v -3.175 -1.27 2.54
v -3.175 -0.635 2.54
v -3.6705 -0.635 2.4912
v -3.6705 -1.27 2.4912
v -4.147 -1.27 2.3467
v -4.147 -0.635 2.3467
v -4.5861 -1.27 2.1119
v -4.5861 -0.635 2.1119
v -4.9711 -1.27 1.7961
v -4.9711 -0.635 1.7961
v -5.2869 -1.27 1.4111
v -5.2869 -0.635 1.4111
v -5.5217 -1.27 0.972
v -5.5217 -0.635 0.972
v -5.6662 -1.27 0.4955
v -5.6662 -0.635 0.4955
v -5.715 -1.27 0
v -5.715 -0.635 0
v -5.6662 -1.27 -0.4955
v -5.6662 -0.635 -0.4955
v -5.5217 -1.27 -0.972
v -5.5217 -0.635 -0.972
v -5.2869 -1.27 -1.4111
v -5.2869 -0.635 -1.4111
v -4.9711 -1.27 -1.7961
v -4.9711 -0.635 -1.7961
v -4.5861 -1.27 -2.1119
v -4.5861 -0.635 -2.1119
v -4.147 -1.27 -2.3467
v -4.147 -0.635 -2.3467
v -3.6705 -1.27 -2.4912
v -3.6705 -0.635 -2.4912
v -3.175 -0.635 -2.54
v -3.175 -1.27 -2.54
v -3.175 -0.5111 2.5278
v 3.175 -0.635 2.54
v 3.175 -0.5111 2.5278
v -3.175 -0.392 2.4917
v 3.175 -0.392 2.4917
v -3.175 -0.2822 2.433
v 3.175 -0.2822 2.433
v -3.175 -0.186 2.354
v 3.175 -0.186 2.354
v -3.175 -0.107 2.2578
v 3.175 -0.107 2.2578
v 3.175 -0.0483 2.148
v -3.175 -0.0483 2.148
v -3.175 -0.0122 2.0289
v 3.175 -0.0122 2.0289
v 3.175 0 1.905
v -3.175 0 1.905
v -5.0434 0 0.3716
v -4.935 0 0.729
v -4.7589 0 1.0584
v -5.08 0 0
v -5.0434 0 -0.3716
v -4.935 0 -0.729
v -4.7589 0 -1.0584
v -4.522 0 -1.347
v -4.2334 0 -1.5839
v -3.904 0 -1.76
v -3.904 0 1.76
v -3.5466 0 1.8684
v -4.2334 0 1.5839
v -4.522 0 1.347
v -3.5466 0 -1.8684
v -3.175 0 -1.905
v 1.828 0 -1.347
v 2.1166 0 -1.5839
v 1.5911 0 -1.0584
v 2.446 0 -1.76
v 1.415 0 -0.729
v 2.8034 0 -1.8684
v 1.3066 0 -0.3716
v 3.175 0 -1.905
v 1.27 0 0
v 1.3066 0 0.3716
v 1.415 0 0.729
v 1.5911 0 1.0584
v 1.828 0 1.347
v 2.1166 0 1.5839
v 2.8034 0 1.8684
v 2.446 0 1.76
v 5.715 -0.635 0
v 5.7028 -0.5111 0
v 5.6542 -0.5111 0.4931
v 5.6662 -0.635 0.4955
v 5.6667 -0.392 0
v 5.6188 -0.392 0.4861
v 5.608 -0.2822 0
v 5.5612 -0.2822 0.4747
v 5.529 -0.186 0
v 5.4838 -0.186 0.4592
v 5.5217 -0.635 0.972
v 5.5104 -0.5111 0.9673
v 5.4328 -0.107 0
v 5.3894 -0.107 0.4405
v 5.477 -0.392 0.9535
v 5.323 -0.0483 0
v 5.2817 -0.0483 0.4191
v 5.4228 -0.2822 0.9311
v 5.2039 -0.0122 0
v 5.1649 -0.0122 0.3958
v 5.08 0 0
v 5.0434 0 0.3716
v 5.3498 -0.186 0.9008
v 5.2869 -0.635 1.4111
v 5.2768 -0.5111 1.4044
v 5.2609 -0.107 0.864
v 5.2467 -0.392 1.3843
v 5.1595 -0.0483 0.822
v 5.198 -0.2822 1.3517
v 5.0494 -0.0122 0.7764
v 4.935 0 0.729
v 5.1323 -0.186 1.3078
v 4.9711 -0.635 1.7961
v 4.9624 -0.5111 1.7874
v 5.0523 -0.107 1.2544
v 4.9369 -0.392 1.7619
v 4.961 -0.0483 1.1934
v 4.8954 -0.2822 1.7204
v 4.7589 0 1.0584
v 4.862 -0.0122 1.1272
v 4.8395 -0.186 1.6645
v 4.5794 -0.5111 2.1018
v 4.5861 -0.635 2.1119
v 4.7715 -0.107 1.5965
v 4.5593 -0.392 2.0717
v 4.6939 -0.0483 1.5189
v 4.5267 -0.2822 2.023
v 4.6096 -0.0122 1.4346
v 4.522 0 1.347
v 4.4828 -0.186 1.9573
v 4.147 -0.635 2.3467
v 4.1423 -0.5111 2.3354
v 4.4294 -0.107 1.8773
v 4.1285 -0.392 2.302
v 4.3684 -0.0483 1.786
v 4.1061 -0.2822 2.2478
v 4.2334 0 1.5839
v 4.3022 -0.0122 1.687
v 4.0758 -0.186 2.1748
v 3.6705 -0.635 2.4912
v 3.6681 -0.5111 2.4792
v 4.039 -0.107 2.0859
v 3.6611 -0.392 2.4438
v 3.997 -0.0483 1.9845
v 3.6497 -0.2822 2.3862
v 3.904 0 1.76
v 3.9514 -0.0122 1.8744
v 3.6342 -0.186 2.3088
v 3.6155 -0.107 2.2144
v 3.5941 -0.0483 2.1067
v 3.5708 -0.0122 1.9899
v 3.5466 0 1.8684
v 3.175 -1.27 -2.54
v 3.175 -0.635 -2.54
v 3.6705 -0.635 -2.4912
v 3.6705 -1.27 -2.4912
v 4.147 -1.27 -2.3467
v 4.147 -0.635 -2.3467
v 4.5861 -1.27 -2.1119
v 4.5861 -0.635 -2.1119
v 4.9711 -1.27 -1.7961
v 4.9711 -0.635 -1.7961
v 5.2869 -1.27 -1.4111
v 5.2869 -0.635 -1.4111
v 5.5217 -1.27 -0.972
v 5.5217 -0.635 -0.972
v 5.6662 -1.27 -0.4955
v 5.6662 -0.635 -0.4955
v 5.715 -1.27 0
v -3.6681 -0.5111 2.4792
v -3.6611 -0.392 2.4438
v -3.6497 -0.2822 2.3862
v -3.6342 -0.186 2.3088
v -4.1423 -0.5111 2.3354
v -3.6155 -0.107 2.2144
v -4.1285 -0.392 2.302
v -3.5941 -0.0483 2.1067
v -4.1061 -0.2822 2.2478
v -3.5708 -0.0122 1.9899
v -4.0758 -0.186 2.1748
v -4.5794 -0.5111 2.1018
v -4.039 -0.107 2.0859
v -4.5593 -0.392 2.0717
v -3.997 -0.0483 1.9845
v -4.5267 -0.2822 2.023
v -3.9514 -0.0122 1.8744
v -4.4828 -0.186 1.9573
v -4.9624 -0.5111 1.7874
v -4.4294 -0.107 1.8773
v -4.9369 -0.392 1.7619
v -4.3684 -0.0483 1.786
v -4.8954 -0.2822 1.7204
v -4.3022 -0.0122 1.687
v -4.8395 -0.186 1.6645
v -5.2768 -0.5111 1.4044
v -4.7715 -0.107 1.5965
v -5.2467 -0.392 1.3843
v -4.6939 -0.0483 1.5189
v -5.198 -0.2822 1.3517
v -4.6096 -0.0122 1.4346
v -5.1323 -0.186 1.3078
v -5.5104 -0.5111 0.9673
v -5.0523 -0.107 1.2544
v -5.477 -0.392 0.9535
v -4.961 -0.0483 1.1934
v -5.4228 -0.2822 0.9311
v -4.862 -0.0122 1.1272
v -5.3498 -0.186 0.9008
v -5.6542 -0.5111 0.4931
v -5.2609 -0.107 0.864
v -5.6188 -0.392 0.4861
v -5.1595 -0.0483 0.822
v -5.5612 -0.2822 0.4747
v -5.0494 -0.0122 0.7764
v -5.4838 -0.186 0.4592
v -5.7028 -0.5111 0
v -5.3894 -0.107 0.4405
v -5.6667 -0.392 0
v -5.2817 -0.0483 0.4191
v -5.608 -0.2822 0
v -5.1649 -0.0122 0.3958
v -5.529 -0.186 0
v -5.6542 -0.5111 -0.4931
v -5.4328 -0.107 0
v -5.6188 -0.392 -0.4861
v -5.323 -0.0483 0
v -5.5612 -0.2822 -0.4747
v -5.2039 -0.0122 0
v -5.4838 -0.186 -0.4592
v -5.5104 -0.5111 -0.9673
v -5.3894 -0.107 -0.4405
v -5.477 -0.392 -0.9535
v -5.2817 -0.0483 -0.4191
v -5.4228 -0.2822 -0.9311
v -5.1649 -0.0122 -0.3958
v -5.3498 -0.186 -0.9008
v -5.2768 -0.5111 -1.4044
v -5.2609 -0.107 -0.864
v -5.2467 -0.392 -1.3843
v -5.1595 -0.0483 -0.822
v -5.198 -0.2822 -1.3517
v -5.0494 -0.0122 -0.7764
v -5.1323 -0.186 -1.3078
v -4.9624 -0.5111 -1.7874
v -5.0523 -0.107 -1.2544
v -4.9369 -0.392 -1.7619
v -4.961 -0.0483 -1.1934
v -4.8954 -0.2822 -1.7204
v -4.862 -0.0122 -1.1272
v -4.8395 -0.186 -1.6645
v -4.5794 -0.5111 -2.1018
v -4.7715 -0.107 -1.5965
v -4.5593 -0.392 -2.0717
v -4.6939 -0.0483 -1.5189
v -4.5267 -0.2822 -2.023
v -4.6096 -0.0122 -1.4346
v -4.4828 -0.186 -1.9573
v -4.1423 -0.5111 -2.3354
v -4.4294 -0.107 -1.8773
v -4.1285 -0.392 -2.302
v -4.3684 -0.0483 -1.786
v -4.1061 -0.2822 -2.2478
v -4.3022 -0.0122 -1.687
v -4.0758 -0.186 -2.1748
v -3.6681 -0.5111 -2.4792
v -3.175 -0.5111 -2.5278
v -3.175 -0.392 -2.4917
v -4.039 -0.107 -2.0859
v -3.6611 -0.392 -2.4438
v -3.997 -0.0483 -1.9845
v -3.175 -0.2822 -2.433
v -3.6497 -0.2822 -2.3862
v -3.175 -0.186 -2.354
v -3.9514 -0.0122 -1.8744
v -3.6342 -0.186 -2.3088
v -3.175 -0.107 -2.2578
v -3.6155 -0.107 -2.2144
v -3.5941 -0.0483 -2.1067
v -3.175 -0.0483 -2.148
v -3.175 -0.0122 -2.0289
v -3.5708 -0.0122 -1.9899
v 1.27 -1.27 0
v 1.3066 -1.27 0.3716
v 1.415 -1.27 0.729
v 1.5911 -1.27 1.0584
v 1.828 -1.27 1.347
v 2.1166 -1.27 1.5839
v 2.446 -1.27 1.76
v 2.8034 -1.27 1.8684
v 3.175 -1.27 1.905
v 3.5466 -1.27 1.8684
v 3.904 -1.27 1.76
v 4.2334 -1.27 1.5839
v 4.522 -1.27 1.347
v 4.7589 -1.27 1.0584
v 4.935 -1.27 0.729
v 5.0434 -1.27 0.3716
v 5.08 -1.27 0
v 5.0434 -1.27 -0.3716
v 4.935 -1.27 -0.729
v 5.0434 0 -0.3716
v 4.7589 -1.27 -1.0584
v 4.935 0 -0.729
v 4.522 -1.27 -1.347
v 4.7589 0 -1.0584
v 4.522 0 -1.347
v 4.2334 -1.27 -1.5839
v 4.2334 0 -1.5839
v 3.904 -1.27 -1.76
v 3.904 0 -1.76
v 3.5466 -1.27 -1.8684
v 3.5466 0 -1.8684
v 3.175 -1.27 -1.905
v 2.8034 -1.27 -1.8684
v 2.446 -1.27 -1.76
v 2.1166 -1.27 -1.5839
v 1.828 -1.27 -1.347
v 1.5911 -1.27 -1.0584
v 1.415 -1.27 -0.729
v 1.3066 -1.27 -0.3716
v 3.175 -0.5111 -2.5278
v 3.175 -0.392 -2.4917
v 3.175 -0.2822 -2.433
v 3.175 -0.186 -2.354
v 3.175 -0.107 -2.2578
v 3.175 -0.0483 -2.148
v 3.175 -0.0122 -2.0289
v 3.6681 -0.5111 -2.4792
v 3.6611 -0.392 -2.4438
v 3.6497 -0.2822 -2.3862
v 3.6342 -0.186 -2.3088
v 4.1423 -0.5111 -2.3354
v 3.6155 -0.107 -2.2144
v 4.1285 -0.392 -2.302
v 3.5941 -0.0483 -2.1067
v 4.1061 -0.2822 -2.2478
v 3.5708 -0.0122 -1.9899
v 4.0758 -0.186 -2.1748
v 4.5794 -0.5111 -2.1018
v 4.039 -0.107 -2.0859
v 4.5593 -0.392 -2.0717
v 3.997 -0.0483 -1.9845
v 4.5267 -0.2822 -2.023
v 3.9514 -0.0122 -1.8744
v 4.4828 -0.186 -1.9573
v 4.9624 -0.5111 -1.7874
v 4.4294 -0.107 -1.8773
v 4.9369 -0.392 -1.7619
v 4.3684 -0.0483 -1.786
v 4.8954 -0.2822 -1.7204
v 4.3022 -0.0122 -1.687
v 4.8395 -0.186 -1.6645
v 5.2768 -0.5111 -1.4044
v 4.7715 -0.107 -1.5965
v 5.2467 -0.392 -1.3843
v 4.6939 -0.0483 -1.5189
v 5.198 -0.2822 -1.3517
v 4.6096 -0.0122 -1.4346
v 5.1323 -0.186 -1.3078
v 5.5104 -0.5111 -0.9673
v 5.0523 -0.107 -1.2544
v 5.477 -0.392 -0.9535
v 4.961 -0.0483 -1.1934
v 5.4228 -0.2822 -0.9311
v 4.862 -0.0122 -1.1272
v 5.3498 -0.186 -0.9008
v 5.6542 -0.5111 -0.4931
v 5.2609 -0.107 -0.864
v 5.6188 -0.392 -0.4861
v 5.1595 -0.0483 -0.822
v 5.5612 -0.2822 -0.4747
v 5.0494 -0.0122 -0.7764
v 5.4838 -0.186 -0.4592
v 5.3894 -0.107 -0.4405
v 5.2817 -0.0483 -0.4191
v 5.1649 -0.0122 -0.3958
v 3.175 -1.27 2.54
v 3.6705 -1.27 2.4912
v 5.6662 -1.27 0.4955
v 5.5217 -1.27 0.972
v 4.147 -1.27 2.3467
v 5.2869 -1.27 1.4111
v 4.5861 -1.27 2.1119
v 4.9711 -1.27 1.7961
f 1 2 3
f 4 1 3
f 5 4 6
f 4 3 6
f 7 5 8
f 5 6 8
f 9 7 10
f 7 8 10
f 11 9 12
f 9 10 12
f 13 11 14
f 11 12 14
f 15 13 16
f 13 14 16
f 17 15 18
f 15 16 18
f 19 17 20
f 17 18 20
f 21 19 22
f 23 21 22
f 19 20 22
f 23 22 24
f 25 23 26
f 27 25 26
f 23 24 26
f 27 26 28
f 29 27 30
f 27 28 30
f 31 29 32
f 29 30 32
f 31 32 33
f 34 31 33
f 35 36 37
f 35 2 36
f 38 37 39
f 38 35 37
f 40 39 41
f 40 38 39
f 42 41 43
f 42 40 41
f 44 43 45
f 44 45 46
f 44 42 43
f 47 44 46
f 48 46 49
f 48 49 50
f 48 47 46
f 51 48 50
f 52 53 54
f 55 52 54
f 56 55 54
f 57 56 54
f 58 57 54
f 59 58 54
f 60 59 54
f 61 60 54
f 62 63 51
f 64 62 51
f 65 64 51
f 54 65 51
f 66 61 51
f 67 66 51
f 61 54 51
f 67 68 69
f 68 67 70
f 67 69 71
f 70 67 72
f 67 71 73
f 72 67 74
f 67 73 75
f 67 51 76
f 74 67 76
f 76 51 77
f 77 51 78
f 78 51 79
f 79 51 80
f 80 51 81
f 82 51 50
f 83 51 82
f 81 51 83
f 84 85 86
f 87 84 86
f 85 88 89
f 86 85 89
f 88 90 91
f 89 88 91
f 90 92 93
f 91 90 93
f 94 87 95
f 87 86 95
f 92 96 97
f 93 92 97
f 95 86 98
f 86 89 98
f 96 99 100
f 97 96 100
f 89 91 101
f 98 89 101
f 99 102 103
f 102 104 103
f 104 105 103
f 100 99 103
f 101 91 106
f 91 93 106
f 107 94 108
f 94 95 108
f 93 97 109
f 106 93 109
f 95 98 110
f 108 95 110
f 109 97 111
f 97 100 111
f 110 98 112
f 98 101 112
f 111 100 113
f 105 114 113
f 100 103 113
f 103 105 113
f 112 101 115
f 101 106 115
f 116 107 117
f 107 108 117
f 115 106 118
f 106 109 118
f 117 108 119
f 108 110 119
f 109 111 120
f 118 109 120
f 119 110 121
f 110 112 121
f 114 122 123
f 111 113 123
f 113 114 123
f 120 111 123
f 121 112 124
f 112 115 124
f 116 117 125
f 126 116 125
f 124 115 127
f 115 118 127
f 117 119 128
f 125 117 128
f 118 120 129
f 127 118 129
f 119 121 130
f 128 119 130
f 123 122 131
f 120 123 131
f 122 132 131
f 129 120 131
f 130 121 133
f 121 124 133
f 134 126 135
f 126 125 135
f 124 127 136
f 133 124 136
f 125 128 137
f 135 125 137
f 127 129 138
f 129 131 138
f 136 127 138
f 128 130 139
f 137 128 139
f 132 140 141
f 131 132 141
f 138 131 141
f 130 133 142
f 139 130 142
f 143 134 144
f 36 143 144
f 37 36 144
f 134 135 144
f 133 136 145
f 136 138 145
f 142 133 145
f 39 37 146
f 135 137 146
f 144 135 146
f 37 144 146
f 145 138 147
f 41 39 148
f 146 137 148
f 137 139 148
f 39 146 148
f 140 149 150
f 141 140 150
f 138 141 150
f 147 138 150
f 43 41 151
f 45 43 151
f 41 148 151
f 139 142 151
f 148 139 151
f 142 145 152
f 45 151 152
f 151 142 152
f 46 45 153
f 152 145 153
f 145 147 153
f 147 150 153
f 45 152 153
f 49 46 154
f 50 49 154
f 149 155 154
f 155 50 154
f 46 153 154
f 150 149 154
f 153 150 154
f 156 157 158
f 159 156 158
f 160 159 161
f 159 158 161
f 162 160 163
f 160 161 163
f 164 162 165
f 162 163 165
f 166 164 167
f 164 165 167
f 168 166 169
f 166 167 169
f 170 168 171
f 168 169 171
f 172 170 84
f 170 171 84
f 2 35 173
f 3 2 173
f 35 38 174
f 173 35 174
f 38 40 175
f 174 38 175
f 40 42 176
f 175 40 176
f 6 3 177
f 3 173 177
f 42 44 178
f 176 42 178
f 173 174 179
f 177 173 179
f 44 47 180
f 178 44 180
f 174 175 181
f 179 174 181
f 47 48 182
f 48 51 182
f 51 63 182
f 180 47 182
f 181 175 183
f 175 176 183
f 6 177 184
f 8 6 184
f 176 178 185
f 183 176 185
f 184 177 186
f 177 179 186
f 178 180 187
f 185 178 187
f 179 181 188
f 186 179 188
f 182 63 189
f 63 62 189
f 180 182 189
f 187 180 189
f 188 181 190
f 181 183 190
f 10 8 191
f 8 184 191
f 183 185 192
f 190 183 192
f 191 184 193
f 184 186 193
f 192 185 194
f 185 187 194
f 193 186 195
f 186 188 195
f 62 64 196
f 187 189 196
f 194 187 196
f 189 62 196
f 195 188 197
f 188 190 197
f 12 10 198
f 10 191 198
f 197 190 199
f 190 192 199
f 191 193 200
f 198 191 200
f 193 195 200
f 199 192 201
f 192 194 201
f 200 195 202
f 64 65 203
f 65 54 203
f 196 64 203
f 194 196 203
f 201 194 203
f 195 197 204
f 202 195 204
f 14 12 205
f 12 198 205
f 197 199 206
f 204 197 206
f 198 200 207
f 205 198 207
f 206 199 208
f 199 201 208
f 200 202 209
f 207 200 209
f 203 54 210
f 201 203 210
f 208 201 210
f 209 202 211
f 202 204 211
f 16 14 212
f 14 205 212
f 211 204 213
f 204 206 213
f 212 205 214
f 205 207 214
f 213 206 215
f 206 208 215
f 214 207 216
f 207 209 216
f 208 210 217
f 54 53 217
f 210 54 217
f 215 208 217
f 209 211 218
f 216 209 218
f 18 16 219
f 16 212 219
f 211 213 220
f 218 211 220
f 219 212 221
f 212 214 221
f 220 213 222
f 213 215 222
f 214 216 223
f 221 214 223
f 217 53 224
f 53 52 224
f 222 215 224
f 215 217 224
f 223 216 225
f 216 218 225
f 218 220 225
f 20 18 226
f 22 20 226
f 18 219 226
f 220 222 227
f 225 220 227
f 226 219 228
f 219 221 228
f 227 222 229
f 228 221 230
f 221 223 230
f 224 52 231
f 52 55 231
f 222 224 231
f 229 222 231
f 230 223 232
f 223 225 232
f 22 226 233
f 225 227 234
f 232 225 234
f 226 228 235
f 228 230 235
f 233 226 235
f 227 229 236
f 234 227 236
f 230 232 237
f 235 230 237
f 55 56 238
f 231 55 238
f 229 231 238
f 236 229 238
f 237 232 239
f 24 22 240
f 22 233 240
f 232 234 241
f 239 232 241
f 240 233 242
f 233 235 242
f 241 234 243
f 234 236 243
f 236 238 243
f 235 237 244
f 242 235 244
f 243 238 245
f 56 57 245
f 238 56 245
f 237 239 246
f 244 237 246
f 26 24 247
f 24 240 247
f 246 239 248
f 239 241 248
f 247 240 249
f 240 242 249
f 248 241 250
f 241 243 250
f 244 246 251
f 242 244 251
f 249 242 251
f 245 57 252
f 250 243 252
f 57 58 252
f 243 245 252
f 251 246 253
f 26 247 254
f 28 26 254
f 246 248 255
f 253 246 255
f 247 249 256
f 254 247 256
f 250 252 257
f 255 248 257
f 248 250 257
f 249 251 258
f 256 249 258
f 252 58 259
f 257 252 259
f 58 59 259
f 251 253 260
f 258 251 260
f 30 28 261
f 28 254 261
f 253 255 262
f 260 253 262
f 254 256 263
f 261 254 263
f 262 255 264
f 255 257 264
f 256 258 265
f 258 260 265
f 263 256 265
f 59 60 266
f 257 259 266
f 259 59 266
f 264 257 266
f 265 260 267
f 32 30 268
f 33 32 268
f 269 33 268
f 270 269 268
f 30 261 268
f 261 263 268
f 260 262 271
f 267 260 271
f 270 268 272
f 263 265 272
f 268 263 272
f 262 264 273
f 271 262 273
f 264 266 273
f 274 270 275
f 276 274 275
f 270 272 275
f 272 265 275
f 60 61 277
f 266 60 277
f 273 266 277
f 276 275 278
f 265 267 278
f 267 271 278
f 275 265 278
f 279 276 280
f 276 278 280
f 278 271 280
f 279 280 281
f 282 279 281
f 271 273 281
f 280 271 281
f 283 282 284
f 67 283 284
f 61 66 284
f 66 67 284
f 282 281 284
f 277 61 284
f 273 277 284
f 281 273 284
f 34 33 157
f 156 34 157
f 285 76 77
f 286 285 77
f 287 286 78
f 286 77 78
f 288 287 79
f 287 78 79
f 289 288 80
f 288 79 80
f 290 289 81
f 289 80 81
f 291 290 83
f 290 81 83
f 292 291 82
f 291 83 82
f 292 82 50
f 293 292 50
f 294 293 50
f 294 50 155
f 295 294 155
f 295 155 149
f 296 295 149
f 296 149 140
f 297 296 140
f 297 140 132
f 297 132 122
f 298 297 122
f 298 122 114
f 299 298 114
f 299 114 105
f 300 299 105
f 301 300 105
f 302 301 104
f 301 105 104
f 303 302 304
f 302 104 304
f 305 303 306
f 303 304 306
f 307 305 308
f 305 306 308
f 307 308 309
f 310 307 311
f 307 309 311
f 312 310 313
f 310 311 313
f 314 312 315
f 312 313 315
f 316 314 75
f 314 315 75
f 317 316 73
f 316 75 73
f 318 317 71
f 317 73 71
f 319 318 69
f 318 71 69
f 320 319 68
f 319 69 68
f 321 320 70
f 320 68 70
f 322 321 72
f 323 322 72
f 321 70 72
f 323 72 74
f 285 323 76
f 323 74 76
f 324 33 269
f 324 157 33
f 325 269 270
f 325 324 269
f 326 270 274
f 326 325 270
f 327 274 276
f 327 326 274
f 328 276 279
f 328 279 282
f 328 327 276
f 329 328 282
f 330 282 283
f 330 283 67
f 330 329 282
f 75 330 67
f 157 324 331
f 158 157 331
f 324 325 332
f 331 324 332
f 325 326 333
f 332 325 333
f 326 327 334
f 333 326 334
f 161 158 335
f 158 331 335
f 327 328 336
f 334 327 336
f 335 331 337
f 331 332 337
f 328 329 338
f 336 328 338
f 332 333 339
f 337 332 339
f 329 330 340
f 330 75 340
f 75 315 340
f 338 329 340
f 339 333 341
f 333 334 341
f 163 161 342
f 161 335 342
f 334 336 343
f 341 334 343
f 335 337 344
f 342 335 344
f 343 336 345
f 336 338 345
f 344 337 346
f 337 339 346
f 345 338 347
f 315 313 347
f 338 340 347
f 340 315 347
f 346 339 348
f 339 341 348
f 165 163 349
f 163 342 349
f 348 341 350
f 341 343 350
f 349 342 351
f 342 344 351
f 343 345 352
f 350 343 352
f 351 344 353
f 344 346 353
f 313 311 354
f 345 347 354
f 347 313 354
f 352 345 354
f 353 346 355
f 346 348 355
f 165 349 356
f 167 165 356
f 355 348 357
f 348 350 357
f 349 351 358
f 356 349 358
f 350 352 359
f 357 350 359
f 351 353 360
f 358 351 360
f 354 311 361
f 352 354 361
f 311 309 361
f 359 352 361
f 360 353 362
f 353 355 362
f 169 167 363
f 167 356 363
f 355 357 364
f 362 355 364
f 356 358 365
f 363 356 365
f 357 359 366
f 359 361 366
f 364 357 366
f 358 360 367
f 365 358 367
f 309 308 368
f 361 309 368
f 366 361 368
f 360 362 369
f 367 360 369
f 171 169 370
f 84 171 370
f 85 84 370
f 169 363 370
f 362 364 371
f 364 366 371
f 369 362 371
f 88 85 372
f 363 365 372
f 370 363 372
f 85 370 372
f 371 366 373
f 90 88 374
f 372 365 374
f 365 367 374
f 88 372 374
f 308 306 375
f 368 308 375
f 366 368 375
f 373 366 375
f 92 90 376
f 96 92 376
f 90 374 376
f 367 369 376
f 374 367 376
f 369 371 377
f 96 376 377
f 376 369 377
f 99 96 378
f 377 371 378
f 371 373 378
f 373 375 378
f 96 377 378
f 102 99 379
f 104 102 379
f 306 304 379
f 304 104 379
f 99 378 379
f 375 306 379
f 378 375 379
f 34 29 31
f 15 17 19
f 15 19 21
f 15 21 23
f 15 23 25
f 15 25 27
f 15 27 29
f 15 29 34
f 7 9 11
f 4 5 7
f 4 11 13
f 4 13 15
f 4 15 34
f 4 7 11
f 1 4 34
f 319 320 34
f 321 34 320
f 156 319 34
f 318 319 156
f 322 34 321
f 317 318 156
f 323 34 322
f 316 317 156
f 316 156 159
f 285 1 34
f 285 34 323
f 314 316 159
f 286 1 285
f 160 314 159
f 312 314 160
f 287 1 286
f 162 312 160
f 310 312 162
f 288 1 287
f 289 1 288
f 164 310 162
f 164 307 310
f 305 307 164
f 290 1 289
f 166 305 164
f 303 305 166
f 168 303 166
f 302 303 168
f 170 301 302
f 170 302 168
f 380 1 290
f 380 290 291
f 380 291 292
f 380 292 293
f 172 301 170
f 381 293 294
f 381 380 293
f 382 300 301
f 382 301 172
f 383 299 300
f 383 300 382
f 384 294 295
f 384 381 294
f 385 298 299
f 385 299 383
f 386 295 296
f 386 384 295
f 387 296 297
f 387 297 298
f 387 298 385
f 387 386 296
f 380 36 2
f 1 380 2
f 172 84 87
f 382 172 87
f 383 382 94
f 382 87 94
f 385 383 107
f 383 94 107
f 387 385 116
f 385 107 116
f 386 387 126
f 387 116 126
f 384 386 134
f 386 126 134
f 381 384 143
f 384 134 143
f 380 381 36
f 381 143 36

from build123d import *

# Parameters (mm, degrees)
F1_DEPTH = 1.27
F2_R     = 0.635
F4_D     = 3.81


with BuildPart() as f1:
    # F0 (on Front) → F1 (new body)
    with BuildSketch(Plane.XZ):
        with BuildLine():
            ThreePointArc((-3.175, -2.54), (-1.378949, -1.796051), (-0.635, 0))
            ThreePointArc((-0.635, 0), (-1.378949, 1.796051), (-3.175, 2.54))
            ThreePointArc((-3.175, 2.54), (-5.715, 0), (-3.175, -2.54))
        make_face()
        with BuildLine():
            ThreePointArc((-3.175, 2.54), (-1.378949, 1.796051), (-0.635, 0))
            ThreePointArc((-0.635, 0), (-1.378949, -1.796051), (-3.175, -2.54))
            Line((-3.175, -2.54), (3.175, -2.54))
            ThreePointArc((3.175, -2.54), (0.635, 0), (3.175, 2.54))
            Line((3.175, 2.54), (-3.175, 2.54))
        make_face()
        with BuildLine():
            ThreePointArc((5.715, 0), (4.971051, 1.796051), (3.175, 2.54))
            ThreePointArc((3.175, 2.54), (0.635, 0), (3.175, -2.54))
            ThreePointArc((3.175, -2.54), (4.971051, -1.796051), (5.715, 0))
        make_face()
    extrude(amount=F1_DEPTH)

    # F2
    f2_edges = [f1.edges().sort_by_distance(p)[0] for p in [
        (0, 0, -2.54),
    ]]
    fillet(f2_edges, radius=F2_R)

    # F4 (through all)
    with Locations(Plane.XZ.offset(1.27)):
        with Locations((3.175, 0)):
            Hole(F4_D / 2)


solid = f1.part
